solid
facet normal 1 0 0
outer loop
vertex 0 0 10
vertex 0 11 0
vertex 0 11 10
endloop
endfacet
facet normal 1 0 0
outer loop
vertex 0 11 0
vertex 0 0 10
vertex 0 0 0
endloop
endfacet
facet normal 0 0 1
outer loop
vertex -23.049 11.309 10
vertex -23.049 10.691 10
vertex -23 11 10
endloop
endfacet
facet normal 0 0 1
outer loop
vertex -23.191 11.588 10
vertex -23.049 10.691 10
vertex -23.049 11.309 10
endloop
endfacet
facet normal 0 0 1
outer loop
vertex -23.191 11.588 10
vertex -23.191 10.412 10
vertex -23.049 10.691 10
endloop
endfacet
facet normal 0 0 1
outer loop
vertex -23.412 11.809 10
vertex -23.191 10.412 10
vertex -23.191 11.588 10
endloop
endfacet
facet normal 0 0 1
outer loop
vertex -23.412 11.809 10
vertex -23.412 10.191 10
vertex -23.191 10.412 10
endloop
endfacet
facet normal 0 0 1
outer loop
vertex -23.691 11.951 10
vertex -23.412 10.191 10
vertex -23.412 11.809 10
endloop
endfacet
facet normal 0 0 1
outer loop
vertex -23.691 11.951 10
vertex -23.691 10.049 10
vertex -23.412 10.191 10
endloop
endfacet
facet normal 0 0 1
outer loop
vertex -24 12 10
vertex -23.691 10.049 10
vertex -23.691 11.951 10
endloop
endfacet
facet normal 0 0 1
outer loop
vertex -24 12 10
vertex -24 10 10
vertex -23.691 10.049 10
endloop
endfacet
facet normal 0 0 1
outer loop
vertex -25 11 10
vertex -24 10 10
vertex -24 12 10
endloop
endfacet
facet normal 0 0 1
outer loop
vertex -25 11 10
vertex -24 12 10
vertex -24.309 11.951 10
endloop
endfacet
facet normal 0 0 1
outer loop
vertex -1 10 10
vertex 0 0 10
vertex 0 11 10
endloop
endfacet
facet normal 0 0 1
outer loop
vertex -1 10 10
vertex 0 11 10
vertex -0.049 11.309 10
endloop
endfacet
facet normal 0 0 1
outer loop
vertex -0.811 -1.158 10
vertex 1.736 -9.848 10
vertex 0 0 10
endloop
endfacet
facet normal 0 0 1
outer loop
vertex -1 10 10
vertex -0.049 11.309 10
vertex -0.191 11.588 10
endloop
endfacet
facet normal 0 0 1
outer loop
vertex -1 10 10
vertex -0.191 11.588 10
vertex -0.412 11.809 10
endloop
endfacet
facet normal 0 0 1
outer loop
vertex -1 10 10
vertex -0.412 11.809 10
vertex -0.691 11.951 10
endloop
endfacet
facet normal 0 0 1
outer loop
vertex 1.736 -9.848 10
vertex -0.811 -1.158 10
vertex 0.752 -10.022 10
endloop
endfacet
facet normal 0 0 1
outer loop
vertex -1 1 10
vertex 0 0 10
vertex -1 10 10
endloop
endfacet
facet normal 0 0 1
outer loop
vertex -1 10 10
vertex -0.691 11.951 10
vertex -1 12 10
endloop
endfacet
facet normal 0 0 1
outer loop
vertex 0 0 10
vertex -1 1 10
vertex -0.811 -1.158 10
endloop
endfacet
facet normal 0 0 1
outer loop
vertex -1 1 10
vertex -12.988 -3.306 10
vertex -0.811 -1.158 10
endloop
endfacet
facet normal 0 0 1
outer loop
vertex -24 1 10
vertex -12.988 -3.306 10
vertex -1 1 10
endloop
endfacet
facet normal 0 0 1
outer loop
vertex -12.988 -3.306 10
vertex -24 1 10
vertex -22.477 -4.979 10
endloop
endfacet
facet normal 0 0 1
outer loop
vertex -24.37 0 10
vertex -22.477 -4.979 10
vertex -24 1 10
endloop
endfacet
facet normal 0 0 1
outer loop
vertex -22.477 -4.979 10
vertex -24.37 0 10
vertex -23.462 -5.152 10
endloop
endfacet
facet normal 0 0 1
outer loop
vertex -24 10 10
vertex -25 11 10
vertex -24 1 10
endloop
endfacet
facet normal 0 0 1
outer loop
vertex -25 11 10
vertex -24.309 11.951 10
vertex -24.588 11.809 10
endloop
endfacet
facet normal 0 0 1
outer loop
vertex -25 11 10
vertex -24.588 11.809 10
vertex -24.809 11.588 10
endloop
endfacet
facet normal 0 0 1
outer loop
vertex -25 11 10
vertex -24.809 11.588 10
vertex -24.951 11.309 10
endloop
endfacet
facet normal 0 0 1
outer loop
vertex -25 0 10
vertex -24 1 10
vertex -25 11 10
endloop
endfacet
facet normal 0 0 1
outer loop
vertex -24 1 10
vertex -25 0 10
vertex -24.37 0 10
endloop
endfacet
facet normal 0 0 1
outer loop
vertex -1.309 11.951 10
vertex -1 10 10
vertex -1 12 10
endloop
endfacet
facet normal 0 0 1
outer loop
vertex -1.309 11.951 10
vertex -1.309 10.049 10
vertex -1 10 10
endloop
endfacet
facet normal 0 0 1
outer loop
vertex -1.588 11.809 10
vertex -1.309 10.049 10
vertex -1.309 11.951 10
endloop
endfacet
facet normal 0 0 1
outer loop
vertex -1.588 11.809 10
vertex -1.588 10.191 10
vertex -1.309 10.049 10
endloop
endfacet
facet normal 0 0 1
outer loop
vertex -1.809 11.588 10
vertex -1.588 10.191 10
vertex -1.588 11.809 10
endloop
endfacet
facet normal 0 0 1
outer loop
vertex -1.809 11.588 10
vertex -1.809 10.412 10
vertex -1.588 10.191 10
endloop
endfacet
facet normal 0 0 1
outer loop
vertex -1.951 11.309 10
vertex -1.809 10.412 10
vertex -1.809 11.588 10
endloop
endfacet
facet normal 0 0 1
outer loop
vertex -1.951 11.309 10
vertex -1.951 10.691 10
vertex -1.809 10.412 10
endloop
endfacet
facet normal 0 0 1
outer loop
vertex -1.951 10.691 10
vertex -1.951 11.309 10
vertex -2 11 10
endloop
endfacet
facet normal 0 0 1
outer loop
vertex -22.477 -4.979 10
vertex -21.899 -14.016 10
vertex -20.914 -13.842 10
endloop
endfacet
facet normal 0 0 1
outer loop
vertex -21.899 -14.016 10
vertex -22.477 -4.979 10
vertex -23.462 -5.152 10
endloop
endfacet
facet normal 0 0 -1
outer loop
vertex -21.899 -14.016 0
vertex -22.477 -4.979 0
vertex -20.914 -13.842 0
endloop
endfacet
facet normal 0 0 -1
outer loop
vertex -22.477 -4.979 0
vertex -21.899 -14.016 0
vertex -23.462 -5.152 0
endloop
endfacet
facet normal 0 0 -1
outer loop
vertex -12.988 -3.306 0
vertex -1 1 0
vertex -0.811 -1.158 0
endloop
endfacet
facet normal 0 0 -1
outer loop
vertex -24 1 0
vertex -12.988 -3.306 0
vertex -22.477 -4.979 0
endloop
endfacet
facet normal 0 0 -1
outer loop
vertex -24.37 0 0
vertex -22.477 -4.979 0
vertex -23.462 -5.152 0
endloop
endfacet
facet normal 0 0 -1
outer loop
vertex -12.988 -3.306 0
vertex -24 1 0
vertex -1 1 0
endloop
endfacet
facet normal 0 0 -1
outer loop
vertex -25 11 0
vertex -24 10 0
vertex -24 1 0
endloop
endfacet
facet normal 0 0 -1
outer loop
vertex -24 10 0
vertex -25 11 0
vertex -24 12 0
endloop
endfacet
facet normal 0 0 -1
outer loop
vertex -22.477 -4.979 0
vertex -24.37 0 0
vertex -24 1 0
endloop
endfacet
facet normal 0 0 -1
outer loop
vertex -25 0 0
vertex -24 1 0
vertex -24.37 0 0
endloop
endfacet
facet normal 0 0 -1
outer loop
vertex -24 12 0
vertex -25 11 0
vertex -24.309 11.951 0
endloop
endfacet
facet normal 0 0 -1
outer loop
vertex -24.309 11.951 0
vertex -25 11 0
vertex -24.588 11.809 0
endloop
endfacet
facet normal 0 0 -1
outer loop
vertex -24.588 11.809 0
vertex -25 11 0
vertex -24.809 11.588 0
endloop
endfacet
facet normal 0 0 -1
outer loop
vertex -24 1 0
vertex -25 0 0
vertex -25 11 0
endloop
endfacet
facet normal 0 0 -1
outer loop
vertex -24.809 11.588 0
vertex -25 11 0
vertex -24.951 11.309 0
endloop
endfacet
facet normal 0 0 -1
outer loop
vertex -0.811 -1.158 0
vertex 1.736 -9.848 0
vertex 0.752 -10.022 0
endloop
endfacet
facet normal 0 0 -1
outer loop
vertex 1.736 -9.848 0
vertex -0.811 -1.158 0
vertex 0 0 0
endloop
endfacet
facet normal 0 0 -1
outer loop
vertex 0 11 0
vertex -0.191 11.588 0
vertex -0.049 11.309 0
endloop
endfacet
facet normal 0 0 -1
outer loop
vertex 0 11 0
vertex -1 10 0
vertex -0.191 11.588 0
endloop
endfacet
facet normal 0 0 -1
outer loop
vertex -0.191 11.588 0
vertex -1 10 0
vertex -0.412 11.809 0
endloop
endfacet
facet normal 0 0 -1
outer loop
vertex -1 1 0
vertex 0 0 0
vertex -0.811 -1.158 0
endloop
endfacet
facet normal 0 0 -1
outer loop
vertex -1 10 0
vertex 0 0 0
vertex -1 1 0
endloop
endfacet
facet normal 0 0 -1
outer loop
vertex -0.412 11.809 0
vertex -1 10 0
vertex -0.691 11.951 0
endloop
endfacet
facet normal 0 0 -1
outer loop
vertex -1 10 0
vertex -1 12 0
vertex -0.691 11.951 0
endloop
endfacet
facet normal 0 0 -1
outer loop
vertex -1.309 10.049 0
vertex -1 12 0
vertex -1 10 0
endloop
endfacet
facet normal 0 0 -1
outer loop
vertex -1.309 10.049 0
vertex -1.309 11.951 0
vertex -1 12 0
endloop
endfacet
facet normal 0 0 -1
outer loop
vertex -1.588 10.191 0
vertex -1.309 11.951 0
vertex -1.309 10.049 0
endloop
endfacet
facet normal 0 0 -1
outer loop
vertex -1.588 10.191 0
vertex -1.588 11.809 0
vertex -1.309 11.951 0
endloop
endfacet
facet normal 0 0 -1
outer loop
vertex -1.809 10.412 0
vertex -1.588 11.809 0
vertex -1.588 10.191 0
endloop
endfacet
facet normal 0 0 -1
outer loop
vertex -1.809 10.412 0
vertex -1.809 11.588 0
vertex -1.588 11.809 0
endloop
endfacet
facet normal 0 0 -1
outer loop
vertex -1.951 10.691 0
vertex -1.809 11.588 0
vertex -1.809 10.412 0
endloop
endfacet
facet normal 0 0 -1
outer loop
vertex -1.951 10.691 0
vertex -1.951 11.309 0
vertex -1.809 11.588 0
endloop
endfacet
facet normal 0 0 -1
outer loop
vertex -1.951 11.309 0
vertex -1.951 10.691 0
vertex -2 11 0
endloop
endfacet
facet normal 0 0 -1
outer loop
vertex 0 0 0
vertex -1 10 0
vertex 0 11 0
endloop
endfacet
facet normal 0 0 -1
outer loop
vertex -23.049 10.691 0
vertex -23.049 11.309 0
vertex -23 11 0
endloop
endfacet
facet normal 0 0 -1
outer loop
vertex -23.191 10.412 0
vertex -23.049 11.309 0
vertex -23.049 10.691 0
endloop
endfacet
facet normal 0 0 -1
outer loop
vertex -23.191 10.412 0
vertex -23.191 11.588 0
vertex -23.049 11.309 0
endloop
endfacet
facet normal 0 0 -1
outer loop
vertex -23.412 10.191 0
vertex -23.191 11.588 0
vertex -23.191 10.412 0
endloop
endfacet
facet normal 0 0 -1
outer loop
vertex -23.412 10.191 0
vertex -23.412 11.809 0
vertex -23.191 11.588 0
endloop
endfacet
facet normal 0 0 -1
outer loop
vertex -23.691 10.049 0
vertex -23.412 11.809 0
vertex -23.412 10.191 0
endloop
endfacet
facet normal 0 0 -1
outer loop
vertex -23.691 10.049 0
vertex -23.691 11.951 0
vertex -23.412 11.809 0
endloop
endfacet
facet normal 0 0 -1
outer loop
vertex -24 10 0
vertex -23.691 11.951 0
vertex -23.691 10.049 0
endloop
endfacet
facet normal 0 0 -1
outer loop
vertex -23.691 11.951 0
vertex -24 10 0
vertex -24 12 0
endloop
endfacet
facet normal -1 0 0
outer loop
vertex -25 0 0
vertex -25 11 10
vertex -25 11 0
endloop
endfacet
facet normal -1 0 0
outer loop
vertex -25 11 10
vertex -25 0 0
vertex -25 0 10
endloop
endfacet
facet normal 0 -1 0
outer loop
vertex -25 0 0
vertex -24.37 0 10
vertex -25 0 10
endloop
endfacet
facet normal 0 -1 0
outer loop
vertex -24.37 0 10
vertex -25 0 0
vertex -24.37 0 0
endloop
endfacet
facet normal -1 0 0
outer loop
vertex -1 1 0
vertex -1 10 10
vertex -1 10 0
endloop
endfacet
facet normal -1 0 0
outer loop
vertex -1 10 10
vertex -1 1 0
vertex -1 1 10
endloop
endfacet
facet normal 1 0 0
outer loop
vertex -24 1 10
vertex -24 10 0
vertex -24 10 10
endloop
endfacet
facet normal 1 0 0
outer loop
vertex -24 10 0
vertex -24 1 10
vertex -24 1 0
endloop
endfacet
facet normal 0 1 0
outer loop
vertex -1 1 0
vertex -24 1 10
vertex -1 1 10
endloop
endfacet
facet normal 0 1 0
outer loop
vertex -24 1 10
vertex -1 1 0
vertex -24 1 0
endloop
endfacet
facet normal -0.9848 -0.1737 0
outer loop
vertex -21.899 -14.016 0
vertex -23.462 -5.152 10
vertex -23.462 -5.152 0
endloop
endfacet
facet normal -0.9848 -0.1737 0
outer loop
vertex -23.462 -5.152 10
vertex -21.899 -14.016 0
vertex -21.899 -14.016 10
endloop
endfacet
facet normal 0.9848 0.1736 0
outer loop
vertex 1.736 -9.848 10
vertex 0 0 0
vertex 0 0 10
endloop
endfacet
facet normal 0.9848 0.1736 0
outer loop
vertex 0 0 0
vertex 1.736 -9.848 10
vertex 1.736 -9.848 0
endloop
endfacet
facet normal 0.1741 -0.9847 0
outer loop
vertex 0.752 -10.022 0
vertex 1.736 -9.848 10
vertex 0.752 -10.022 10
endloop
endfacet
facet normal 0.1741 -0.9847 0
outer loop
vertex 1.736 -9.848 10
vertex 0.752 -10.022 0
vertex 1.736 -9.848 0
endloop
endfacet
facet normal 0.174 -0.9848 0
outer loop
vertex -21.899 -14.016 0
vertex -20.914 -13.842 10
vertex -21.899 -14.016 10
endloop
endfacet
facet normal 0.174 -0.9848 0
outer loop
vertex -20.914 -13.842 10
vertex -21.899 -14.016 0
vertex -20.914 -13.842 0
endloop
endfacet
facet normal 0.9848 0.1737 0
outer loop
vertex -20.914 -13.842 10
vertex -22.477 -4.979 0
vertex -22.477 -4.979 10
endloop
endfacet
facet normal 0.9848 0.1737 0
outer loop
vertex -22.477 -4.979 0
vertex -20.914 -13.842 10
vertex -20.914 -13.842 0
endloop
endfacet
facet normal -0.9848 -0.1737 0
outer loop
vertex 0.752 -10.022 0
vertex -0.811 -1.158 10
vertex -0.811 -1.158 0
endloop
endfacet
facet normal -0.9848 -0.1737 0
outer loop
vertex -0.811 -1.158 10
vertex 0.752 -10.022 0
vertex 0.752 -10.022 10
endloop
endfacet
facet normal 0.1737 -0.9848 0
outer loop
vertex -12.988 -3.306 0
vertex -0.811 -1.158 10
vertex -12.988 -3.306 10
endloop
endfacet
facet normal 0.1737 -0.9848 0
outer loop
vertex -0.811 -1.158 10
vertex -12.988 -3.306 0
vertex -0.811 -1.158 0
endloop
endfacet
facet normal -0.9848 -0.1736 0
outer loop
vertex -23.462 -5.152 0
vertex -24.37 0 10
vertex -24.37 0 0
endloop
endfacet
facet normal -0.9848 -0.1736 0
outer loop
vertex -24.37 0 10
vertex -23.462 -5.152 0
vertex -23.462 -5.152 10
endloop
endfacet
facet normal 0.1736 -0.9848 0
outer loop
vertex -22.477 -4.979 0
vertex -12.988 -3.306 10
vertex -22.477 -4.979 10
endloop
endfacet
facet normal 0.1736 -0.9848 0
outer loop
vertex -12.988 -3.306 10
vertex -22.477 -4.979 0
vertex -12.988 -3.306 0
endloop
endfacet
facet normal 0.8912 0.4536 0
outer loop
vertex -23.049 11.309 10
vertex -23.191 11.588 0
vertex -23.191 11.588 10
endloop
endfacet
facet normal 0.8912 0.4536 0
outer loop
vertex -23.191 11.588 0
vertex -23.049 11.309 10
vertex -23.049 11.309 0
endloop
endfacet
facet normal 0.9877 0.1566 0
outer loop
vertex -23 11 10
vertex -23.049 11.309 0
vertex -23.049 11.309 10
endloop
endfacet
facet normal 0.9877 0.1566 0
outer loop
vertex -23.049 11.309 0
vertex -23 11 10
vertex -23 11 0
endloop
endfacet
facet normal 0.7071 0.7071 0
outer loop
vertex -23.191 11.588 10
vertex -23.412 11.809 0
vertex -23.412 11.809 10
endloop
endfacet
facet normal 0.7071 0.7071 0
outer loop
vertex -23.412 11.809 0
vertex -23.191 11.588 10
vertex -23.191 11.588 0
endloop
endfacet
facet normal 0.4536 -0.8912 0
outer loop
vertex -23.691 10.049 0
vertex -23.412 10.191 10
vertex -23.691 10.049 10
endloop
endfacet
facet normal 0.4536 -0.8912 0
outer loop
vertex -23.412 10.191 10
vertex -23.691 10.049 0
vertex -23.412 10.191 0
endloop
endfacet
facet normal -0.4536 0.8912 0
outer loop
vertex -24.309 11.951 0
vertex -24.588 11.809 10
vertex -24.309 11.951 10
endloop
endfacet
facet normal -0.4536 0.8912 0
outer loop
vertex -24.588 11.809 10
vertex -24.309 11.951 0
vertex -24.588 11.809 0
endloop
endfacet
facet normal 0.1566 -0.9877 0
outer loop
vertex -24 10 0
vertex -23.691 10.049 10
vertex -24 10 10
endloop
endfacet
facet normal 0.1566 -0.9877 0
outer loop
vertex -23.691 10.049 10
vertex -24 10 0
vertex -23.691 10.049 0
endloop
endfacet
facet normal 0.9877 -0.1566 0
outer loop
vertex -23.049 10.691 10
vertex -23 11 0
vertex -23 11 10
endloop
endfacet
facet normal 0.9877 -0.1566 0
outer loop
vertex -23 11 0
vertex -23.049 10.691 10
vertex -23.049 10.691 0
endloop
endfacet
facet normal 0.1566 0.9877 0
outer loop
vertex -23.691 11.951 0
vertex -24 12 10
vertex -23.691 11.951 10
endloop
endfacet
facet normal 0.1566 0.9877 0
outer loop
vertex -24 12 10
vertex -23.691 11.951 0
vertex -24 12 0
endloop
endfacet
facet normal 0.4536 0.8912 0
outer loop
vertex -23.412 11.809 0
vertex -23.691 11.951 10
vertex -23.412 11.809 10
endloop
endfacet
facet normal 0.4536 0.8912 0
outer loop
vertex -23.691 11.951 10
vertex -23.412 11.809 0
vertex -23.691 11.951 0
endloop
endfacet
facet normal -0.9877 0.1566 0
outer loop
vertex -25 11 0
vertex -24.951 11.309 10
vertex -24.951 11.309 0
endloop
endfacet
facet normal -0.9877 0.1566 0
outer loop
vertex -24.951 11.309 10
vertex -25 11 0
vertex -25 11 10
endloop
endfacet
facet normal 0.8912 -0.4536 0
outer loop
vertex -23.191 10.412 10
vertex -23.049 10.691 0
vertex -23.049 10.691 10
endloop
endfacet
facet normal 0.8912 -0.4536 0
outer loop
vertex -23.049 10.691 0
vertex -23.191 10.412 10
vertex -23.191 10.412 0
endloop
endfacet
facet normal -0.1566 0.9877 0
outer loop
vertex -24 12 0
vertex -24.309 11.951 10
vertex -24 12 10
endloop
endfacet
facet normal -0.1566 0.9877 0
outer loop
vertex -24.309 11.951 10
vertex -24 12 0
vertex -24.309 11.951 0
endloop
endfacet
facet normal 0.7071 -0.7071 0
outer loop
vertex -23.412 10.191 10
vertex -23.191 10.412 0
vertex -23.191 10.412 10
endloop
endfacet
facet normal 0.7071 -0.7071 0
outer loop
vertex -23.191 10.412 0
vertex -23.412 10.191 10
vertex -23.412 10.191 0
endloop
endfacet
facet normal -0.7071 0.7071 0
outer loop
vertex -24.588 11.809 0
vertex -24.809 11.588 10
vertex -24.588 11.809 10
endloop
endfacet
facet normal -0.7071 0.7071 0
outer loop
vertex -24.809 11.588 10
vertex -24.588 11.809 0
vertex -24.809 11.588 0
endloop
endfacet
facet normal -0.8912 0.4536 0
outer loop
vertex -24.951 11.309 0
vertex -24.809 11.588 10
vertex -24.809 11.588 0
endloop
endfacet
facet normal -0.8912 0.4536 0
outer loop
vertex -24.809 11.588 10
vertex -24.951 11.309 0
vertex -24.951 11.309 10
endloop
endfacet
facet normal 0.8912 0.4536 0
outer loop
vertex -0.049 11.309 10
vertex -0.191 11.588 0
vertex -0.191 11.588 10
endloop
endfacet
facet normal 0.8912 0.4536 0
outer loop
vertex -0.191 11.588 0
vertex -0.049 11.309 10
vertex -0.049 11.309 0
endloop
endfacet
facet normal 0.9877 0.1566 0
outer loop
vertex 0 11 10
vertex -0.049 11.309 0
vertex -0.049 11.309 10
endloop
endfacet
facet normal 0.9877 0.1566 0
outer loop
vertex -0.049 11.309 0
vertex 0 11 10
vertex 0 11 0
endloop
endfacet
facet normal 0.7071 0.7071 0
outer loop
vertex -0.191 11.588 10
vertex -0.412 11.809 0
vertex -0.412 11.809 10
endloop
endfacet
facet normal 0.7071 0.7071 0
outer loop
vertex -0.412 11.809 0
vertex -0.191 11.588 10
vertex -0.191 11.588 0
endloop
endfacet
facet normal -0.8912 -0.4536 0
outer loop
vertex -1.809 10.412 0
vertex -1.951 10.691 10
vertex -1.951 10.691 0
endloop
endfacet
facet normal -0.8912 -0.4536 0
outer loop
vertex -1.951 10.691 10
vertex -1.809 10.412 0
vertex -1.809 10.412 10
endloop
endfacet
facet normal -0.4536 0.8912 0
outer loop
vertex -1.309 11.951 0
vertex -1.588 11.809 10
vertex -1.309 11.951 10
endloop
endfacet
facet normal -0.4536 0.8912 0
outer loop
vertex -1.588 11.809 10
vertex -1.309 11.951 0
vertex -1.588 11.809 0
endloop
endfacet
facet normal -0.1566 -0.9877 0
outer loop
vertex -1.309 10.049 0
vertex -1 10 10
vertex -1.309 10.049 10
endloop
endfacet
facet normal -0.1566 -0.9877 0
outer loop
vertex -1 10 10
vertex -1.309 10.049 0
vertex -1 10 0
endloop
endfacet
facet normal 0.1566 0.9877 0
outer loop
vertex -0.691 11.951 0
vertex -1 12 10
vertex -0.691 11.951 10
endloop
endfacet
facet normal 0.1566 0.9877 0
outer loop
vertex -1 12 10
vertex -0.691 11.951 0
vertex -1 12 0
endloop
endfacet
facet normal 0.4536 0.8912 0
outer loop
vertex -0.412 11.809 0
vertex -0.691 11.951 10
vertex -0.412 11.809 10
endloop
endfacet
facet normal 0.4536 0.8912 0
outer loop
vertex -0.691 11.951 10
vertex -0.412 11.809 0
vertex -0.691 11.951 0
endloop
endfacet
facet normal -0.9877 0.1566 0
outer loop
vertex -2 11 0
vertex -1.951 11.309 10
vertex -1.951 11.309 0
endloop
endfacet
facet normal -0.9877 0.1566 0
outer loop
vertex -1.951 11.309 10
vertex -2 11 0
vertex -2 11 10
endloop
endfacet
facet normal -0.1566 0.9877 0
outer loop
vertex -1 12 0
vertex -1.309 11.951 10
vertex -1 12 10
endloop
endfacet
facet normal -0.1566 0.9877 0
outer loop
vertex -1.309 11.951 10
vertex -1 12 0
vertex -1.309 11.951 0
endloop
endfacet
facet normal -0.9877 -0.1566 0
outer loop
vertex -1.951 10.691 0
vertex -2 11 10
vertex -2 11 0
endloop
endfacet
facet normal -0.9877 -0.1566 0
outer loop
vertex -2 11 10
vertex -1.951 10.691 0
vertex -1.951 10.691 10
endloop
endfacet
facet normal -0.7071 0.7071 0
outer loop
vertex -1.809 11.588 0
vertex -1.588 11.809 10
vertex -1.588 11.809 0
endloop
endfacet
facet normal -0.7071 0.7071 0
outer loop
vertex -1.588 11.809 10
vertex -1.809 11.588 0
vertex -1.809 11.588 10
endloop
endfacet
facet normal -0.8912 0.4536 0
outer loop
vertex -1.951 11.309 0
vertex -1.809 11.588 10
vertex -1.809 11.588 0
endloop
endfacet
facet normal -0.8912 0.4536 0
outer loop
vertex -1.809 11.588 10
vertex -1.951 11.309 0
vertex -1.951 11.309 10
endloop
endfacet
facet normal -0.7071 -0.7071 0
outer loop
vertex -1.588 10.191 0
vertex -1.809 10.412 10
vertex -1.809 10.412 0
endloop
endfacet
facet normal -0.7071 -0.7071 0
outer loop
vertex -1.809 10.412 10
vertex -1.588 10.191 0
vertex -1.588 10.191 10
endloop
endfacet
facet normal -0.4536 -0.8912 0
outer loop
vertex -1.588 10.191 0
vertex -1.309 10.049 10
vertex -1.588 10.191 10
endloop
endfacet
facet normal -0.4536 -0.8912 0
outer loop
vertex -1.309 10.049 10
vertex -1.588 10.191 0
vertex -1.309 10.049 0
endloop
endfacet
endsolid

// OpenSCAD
// Wii Sensor Bar Stand


// Angle of sensor
a = 10;

// Width of TV edge (mm)
w = 22;

// Depth of TV edge (mm)
d = 9;

/*[Hidden]*/
$fn=20;

// Wii sensor holder
difference(){
	translate([-25,0,0])cube([25,11,10]);
	translate([-24,1,-1]) cube([23,11,12]);
	}
	translate([-24,11,0]) cylinder(r=1,h=10);
	translate([-1,11,0]) cylinder(r=1,h=10);

// TV edge holder
difference(){
	rotate([0,0,180+a]) translate([0,0,0]) cube([w+2,d+1,10]);
	rotate([0,0,180+a]) translate([1,1,-1]) cube([w,d+1,12]);
	}

// Fill piece
intersection(){
	rotate([0,0,180+a]) translate([0,-2*d,0]) cube([w+2,2*d+1,10]);
	translate([-26,-30,0])cube([26,31,10]);
}
